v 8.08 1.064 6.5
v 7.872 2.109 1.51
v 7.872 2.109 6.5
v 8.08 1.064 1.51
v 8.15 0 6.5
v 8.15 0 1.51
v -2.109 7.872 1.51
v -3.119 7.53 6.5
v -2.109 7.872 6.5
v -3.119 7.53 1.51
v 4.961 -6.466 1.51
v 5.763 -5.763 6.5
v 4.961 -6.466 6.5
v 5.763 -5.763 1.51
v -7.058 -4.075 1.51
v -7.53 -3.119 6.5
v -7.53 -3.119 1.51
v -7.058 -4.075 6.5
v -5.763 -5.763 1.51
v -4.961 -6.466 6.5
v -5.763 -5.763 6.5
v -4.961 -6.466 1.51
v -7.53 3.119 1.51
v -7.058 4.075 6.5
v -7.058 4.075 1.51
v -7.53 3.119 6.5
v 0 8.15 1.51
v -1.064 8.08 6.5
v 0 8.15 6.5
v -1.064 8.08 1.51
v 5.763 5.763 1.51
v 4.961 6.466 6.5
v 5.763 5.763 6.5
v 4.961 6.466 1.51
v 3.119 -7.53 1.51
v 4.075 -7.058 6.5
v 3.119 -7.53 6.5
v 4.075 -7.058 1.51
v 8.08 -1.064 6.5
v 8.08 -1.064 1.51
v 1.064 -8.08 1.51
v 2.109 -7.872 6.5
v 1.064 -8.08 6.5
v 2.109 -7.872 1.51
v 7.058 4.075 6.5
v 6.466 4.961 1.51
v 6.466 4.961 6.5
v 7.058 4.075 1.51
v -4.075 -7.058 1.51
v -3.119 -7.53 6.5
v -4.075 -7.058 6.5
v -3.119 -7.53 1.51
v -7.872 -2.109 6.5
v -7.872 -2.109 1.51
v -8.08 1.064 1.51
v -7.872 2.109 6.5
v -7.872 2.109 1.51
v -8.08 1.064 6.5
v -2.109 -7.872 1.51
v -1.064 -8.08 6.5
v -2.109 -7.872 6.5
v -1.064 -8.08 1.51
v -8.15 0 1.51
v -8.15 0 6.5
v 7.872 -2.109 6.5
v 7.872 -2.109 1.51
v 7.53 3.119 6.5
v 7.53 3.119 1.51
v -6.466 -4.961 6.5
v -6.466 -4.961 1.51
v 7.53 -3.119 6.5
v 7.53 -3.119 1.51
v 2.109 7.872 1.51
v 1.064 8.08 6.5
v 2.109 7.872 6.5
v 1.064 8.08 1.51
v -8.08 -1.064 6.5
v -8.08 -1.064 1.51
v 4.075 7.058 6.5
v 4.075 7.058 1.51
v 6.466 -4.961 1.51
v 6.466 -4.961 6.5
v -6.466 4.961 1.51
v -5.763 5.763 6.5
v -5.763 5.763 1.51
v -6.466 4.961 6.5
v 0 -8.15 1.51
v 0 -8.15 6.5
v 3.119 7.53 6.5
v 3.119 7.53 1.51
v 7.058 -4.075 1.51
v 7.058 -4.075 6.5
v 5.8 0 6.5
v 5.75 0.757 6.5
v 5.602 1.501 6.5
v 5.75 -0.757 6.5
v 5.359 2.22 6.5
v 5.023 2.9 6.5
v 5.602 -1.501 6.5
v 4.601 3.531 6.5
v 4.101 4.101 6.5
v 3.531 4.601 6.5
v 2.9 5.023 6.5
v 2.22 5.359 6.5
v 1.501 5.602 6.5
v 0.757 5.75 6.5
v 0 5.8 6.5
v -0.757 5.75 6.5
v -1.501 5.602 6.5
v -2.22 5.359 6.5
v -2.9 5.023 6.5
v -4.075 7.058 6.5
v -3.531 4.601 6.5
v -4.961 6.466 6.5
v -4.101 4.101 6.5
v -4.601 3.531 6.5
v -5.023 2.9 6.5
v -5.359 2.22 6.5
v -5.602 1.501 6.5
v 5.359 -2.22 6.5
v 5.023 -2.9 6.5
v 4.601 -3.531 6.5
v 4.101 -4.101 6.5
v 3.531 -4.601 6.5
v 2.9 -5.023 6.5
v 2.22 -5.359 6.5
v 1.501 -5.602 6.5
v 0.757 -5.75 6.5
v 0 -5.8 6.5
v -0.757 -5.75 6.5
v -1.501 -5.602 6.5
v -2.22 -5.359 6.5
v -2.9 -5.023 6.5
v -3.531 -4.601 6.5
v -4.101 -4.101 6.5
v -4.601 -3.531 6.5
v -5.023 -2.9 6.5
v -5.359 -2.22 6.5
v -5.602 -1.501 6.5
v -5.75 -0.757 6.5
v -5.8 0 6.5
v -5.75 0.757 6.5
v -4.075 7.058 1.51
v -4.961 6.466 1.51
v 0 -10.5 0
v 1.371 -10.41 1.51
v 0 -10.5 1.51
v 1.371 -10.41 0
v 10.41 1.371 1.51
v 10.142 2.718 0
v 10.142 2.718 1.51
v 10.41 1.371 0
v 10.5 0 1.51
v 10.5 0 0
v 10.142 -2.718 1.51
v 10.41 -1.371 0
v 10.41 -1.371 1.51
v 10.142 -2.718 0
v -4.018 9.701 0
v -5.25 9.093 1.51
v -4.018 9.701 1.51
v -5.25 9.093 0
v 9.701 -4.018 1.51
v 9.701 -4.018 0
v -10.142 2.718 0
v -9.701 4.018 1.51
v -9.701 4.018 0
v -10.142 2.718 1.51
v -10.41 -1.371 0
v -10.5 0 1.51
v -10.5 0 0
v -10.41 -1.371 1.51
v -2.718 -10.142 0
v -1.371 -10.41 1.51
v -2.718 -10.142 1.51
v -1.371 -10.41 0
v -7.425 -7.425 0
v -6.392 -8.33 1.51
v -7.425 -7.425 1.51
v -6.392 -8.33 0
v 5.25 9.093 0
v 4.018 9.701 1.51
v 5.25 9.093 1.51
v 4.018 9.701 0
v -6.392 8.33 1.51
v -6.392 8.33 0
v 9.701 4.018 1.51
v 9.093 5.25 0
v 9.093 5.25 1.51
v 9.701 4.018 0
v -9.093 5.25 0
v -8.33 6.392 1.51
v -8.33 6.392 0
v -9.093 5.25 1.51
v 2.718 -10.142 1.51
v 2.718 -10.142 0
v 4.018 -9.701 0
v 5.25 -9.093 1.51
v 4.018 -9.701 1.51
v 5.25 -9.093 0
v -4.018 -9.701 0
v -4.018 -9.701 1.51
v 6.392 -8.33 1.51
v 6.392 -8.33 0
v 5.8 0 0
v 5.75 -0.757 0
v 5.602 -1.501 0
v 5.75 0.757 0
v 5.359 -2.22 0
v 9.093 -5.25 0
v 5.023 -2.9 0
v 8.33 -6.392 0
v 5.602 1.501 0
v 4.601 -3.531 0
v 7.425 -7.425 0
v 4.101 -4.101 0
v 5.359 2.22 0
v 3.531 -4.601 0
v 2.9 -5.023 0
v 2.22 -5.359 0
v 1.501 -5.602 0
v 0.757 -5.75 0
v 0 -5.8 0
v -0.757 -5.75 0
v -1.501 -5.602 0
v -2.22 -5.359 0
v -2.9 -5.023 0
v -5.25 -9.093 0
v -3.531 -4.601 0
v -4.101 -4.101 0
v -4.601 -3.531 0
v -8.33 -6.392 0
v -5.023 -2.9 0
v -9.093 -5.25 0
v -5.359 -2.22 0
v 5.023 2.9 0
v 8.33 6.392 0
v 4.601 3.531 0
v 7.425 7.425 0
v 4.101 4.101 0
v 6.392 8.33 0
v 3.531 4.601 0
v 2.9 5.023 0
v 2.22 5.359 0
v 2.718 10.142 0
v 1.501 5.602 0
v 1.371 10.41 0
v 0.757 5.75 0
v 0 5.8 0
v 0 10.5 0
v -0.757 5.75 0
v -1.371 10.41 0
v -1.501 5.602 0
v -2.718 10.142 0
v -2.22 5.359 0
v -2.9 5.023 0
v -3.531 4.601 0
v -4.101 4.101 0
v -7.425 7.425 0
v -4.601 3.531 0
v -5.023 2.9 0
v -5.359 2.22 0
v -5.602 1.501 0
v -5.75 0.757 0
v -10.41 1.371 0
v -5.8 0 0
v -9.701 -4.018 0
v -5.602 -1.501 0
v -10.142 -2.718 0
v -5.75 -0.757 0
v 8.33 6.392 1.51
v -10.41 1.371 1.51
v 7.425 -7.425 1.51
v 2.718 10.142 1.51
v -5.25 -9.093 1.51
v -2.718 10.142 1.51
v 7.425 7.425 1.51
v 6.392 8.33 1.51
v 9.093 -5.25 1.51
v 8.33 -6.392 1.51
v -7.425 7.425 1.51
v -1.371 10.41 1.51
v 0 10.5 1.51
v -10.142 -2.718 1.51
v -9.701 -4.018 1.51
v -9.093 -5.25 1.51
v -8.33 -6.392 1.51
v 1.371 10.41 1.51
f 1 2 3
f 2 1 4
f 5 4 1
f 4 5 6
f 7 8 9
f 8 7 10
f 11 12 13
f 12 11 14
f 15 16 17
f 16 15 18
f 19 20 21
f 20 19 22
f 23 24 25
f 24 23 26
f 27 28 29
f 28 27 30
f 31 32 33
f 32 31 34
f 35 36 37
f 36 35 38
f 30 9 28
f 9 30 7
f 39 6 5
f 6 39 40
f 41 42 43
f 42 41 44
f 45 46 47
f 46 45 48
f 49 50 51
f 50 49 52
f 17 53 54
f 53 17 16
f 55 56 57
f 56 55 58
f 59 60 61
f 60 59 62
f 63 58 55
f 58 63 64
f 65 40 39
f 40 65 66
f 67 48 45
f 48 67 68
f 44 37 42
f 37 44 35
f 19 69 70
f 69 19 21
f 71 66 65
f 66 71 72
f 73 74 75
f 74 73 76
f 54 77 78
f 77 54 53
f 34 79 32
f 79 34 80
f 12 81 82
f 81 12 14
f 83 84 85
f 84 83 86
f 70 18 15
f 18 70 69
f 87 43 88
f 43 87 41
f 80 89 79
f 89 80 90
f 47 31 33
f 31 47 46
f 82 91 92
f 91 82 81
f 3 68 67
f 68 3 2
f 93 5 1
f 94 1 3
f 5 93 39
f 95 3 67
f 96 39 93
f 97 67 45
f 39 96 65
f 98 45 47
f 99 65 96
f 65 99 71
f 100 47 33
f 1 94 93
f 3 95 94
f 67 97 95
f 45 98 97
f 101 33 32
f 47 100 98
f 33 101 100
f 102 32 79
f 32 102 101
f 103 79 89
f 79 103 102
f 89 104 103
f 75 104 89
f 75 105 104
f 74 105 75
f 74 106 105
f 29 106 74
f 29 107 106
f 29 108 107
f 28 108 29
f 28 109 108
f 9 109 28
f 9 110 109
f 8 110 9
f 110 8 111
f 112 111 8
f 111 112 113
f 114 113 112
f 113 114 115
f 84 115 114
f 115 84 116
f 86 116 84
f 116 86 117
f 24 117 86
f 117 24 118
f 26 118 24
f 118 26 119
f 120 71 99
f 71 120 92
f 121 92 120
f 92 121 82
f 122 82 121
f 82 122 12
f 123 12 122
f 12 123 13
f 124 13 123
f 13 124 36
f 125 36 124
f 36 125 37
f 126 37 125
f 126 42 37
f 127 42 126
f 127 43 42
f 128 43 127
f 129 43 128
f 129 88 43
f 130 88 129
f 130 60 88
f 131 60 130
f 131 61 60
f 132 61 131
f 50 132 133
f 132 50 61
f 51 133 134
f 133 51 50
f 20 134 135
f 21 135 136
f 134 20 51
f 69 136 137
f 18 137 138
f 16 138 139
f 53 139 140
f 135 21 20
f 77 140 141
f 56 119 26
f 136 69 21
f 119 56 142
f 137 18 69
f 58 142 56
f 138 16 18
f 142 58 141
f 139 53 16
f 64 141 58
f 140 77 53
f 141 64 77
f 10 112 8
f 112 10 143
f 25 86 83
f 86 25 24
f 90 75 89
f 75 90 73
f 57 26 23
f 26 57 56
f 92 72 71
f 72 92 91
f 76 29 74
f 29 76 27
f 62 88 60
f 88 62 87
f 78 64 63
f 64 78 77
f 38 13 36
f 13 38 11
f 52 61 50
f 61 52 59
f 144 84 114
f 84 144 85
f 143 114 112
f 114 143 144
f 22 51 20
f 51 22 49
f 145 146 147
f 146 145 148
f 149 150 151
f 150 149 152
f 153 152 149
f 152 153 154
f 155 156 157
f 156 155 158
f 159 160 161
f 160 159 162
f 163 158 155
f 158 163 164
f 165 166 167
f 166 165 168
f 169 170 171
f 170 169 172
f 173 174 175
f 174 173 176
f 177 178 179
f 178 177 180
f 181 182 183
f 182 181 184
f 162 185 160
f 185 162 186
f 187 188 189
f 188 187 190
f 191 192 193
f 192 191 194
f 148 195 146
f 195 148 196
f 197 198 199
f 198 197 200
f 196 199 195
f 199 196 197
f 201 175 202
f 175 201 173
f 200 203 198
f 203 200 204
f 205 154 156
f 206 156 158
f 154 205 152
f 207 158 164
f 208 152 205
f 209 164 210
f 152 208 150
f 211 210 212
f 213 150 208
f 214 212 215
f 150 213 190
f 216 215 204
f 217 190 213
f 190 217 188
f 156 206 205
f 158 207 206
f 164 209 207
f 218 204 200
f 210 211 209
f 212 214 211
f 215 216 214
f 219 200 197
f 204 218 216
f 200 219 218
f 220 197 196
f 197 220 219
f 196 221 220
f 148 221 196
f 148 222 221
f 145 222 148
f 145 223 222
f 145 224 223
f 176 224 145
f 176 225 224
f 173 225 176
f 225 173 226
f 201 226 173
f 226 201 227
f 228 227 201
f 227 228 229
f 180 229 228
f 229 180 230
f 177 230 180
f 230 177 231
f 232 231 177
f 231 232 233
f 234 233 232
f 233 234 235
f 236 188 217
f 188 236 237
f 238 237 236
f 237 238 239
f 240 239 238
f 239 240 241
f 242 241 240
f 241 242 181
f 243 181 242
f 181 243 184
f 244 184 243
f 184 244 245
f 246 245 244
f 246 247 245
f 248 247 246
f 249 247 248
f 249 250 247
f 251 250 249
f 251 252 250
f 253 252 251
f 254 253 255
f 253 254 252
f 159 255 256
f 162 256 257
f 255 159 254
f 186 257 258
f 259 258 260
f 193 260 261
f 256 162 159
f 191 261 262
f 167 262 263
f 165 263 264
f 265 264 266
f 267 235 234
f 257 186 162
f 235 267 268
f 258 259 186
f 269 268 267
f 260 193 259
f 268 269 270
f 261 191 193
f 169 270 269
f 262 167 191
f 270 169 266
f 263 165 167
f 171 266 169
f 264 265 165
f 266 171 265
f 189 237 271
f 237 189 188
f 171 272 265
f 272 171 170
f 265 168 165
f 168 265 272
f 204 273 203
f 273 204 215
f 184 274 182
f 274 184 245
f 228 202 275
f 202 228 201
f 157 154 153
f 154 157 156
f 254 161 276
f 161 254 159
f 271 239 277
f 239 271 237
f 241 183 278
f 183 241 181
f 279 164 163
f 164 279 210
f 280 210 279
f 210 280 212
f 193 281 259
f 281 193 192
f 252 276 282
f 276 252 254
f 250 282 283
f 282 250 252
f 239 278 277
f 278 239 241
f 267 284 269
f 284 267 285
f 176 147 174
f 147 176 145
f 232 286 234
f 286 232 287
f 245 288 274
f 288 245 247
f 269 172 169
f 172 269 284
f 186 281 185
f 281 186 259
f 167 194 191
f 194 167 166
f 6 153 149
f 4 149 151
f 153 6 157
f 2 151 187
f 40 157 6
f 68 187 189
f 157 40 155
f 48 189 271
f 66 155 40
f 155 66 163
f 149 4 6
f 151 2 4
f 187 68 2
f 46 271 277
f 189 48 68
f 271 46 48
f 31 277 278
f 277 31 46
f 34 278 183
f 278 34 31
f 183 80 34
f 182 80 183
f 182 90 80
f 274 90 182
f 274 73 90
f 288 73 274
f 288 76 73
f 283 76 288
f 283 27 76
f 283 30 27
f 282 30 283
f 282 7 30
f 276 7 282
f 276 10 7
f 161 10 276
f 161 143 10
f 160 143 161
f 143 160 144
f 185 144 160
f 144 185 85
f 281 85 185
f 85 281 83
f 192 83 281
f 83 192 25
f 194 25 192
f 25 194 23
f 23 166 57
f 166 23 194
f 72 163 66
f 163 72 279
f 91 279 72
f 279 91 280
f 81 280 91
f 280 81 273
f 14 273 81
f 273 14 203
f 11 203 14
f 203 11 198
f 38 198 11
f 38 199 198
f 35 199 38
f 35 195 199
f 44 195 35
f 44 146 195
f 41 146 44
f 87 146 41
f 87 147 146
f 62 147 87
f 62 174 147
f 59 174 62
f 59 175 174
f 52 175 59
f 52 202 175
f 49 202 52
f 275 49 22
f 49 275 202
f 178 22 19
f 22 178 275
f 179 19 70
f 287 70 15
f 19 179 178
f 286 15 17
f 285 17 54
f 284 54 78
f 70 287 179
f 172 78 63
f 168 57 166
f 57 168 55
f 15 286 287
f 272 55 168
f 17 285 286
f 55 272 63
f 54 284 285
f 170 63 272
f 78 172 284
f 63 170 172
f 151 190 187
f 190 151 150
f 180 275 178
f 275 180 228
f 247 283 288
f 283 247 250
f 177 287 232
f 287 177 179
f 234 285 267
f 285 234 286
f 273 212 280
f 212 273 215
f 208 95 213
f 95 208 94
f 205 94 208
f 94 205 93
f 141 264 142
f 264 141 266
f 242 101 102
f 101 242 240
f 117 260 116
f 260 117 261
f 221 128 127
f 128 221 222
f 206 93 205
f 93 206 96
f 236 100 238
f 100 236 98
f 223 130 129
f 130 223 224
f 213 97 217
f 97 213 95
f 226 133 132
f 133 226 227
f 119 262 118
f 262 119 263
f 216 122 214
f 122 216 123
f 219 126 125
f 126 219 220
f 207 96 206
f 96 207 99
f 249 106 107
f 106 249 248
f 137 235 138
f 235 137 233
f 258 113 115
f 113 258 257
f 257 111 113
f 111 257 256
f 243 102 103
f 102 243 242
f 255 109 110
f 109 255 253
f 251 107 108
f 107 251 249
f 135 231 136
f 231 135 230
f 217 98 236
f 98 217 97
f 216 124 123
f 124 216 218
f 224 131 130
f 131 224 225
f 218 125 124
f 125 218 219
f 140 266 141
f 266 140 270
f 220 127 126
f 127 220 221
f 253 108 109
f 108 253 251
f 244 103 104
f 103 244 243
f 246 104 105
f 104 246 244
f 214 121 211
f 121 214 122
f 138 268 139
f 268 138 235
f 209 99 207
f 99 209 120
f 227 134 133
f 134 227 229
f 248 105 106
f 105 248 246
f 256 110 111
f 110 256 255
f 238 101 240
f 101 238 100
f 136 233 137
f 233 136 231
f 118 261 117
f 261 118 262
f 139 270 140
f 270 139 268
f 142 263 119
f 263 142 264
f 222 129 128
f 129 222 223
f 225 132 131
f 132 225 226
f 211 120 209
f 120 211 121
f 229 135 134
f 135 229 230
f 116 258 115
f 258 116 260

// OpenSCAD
include <../lib/meshtastic-drybag-node-lib.scad>;
$fn = 40;
grommet_print();
